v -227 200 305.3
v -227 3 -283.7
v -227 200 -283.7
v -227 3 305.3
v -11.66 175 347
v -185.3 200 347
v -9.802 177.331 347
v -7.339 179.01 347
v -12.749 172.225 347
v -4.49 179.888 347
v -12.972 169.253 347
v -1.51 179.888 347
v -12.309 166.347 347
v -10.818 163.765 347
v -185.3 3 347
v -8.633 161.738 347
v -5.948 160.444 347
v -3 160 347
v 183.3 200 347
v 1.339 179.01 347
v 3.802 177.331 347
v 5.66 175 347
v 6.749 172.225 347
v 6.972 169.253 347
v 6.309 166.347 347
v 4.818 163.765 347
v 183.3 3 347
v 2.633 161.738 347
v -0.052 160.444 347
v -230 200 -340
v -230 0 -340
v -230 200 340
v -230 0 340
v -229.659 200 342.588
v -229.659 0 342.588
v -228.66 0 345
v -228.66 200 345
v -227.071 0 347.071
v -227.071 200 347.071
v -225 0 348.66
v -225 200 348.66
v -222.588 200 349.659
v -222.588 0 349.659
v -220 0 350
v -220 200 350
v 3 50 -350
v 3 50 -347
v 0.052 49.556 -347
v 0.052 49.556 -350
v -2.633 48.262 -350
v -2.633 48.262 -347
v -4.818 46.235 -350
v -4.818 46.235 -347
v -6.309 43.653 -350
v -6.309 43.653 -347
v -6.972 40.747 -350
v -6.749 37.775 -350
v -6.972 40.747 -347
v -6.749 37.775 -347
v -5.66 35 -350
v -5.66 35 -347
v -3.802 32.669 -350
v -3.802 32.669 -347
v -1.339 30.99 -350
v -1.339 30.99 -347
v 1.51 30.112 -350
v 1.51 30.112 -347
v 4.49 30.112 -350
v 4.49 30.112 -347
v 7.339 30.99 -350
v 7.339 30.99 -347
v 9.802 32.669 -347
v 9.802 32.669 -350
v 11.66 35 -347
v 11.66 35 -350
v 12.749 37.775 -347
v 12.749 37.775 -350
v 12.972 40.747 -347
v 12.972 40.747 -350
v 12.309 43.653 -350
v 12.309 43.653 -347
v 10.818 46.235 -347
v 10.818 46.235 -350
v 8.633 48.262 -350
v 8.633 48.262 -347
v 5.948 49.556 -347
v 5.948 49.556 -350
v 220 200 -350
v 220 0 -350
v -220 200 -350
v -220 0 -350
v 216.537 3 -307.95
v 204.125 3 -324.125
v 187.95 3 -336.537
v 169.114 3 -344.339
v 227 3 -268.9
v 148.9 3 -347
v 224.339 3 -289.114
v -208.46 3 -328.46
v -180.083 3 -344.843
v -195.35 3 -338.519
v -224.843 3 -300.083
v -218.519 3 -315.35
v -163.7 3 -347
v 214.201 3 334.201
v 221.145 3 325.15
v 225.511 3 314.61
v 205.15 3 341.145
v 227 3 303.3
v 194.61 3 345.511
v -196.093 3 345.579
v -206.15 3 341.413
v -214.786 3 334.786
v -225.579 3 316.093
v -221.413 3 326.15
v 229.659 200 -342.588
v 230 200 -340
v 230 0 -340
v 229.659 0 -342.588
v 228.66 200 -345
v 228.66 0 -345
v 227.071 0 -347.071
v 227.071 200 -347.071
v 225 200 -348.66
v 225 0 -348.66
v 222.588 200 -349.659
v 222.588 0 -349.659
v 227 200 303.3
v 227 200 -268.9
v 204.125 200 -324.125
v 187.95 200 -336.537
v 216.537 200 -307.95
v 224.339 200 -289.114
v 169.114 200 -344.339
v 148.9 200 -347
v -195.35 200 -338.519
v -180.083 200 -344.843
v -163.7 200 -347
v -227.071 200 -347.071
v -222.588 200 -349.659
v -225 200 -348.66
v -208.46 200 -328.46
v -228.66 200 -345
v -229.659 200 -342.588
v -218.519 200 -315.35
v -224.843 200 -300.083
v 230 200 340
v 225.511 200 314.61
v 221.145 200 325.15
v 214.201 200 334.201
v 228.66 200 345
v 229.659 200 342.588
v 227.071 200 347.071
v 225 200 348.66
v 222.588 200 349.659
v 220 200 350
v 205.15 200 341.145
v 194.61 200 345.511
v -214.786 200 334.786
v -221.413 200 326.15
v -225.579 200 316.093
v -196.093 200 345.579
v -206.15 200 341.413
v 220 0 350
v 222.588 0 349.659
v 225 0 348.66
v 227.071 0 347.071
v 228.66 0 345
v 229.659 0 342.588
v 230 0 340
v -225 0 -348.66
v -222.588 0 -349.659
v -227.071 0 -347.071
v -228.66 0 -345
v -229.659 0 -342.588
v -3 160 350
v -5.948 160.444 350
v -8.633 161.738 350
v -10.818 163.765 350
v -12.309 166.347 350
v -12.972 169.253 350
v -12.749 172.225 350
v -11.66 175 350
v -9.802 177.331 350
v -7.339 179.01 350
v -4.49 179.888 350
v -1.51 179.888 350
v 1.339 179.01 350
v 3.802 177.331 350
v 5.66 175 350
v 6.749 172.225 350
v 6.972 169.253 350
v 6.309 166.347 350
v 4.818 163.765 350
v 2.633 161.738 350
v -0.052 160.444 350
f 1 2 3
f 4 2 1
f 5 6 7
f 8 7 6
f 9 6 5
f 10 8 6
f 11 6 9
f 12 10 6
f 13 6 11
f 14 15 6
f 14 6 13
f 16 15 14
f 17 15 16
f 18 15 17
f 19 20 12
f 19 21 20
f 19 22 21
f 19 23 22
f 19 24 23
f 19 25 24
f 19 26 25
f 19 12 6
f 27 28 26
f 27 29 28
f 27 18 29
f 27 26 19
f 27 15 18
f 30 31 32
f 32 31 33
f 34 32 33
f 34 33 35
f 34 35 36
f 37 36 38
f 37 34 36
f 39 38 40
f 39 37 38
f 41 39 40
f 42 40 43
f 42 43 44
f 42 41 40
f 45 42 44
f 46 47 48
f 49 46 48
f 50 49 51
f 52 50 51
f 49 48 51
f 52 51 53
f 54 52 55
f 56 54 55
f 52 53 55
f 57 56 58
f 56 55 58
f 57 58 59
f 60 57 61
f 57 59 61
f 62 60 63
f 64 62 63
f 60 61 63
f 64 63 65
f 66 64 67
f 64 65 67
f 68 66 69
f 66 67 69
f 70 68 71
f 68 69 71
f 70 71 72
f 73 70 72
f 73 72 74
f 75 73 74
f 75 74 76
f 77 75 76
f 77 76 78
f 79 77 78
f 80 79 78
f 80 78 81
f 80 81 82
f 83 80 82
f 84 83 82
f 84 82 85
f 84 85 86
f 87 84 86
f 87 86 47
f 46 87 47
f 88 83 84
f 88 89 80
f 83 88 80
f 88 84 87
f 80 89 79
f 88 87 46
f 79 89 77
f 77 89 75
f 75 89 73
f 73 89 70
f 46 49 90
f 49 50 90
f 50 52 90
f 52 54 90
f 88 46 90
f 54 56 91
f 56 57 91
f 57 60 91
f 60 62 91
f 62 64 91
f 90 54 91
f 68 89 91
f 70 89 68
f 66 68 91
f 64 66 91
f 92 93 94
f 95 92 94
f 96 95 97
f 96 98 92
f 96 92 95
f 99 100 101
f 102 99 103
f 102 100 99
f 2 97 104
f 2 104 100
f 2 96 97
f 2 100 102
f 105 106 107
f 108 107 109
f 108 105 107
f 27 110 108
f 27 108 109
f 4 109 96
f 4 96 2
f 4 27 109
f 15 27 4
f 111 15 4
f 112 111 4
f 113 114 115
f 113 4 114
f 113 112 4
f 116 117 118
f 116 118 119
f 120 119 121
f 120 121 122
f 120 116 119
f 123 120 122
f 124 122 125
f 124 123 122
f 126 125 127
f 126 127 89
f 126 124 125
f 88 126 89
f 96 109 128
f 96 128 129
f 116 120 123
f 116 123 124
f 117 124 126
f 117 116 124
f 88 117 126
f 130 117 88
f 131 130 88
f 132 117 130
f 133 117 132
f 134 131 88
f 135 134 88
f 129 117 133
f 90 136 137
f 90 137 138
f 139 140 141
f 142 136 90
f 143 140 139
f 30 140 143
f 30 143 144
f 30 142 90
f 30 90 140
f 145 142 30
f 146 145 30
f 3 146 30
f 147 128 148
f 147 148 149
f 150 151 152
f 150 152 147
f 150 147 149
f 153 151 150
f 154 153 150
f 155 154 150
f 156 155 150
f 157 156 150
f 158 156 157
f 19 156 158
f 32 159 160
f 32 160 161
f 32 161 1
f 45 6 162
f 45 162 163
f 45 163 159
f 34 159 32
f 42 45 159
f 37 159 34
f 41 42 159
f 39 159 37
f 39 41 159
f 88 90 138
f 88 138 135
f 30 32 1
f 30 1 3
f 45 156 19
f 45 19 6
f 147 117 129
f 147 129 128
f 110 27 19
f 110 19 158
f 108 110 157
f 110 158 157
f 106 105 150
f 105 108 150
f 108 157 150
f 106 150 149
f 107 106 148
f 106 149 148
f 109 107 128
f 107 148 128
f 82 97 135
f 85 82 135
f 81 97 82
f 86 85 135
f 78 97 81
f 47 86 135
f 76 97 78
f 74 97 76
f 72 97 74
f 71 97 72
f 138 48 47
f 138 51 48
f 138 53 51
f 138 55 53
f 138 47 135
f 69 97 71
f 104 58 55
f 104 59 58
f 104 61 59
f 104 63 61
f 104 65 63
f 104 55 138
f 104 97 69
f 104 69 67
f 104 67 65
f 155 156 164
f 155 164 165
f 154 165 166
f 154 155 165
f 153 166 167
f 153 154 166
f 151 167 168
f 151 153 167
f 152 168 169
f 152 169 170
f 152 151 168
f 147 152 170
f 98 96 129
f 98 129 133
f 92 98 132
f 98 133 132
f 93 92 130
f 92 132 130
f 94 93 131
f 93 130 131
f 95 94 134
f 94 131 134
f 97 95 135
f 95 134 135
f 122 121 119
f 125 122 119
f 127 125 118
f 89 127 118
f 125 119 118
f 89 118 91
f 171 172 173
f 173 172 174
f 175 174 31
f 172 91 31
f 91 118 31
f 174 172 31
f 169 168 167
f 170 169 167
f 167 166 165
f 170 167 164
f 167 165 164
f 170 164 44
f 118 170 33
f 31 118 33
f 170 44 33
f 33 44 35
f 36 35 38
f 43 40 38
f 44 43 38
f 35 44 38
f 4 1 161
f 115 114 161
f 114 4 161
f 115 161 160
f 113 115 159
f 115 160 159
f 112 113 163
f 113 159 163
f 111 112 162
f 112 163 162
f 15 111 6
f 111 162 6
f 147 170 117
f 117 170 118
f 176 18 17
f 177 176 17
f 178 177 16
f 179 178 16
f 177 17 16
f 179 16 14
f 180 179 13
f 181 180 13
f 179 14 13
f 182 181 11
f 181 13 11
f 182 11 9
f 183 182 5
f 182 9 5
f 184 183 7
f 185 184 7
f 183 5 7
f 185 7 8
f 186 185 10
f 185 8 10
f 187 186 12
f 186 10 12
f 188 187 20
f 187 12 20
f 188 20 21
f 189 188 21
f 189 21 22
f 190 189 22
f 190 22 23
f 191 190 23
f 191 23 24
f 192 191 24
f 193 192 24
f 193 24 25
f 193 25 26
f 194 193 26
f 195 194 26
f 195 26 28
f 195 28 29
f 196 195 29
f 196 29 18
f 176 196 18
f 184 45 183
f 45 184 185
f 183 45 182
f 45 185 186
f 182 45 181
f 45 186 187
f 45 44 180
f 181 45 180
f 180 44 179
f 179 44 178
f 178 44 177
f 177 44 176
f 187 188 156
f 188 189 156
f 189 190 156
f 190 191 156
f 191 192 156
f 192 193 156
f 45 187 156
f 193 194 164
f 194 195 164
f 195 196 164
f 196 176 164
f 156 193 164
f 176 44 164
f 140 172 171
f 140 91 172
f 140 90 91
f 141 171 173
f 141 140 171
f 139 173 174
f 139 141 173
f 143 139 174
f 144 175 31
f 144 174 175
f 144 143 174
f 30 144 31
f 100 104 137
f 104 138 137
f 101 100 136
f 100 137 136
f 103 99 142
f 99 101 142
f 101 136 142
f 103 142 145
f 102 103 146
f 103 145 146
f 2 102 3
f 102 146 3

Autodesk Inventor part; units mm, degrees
ref_plane "YZ Plane" through (0, 0, 0) normal (1, 0, 0) x (0, 1, 0)
ref_plane "XZ Plane" through (0, 0, 0) normal (0, 1, 0) x (-1, 0, 0)
ref_plane "XY Plane" through (0, 0, 0) normal (0, 0, 1) x (1, 0, 0)
sketch "Sketch1" plane through (0, 0, 0) normal (0, 1, 0) x (-1, 0, 0)
  line L0 (230, 350) -> (-230, 350)
  line L1 (-230, 350) -> (-230, -350)
  line L2 (-230, -350) -> (230, -350)
  line L3 (230, -350) -> (230, 350)
  line L4 (230, 350) -> (-230, -350) construction
  line L5 (-230, 350) -> (230, -350) construction
  line L6 (227, 347) -> (-227, 347)
  line L7 (-227, 347) -> (-227, -347)
  line L8 (-227, -347) -> (227, -347)
  line L9 (227, -347) -> (227, 347)
  line L10 (227, 347) -> (-227, -347) construction
  line L11 (-227, 347) -> (227, -347) construction
  point P0 (0, 0)
  dimension "d0" = 460
  dimension "d1" = 700
  dimension "d2" = 454
  dimension "d3" = 694
extrude "Extrusion1" add sketch "Sketch1" along normal blind 3 contours L9 L8 L7 L6
extrude "Extrusion2" add sketch "Sketch1" along normal blind 200
sketch "Sketch2" plane through (-230, 0, 350) normal (0, 0, 1) x (1, 0, 0)
  line L0 (0, 0) -> (460, 0) projected
  line L1 (0, 0) -> (0, 200) projected
  point P0 (230, 0)
  point P1 (227, 170)
  dimension "d15" = 170
  dimension "d16" = 227
hole "Hole1" at (-3, 170, 350) direction (0, 0, -1) diameter 20 depth 3 tip angle 118
sketch "Sketch3" plane through (230, 0, -350) normal (0, 0, -1) x (-1, 0, 0)
  line L0 (0, 0) -> (0, 200) projected
  line L1 (0, 0) -> (460, 0) projected
  point P0 (230, 0)
  point P1 (227, 40)
  dimension "d24" = 227
  dimension "d25" = 40
hole "Hole2" at (3, 40, -350) direction (0, 0, 1) diameter 20 depth 3 tip angle 118
fillet "Fillet1" radius 10 4 edges at (230, 100, 350) (230, 100, -350) (-230, 100, 350) (-230, 100, -350)
fillet "Fillet2" radius 41.7 1 edges at (-227, 101.5, 347)
fillet "Fillet3" radius 63.3 1 edges at (-227, 101.5, -347)
fillet "Fillet4" radius 78.1 1 edges at (227, 101.5, -347)
fillet "Fillet5" radius 43.7 1 edges at (227, 101.5, 347)
properties part number "Ammonia Filter Tub"
